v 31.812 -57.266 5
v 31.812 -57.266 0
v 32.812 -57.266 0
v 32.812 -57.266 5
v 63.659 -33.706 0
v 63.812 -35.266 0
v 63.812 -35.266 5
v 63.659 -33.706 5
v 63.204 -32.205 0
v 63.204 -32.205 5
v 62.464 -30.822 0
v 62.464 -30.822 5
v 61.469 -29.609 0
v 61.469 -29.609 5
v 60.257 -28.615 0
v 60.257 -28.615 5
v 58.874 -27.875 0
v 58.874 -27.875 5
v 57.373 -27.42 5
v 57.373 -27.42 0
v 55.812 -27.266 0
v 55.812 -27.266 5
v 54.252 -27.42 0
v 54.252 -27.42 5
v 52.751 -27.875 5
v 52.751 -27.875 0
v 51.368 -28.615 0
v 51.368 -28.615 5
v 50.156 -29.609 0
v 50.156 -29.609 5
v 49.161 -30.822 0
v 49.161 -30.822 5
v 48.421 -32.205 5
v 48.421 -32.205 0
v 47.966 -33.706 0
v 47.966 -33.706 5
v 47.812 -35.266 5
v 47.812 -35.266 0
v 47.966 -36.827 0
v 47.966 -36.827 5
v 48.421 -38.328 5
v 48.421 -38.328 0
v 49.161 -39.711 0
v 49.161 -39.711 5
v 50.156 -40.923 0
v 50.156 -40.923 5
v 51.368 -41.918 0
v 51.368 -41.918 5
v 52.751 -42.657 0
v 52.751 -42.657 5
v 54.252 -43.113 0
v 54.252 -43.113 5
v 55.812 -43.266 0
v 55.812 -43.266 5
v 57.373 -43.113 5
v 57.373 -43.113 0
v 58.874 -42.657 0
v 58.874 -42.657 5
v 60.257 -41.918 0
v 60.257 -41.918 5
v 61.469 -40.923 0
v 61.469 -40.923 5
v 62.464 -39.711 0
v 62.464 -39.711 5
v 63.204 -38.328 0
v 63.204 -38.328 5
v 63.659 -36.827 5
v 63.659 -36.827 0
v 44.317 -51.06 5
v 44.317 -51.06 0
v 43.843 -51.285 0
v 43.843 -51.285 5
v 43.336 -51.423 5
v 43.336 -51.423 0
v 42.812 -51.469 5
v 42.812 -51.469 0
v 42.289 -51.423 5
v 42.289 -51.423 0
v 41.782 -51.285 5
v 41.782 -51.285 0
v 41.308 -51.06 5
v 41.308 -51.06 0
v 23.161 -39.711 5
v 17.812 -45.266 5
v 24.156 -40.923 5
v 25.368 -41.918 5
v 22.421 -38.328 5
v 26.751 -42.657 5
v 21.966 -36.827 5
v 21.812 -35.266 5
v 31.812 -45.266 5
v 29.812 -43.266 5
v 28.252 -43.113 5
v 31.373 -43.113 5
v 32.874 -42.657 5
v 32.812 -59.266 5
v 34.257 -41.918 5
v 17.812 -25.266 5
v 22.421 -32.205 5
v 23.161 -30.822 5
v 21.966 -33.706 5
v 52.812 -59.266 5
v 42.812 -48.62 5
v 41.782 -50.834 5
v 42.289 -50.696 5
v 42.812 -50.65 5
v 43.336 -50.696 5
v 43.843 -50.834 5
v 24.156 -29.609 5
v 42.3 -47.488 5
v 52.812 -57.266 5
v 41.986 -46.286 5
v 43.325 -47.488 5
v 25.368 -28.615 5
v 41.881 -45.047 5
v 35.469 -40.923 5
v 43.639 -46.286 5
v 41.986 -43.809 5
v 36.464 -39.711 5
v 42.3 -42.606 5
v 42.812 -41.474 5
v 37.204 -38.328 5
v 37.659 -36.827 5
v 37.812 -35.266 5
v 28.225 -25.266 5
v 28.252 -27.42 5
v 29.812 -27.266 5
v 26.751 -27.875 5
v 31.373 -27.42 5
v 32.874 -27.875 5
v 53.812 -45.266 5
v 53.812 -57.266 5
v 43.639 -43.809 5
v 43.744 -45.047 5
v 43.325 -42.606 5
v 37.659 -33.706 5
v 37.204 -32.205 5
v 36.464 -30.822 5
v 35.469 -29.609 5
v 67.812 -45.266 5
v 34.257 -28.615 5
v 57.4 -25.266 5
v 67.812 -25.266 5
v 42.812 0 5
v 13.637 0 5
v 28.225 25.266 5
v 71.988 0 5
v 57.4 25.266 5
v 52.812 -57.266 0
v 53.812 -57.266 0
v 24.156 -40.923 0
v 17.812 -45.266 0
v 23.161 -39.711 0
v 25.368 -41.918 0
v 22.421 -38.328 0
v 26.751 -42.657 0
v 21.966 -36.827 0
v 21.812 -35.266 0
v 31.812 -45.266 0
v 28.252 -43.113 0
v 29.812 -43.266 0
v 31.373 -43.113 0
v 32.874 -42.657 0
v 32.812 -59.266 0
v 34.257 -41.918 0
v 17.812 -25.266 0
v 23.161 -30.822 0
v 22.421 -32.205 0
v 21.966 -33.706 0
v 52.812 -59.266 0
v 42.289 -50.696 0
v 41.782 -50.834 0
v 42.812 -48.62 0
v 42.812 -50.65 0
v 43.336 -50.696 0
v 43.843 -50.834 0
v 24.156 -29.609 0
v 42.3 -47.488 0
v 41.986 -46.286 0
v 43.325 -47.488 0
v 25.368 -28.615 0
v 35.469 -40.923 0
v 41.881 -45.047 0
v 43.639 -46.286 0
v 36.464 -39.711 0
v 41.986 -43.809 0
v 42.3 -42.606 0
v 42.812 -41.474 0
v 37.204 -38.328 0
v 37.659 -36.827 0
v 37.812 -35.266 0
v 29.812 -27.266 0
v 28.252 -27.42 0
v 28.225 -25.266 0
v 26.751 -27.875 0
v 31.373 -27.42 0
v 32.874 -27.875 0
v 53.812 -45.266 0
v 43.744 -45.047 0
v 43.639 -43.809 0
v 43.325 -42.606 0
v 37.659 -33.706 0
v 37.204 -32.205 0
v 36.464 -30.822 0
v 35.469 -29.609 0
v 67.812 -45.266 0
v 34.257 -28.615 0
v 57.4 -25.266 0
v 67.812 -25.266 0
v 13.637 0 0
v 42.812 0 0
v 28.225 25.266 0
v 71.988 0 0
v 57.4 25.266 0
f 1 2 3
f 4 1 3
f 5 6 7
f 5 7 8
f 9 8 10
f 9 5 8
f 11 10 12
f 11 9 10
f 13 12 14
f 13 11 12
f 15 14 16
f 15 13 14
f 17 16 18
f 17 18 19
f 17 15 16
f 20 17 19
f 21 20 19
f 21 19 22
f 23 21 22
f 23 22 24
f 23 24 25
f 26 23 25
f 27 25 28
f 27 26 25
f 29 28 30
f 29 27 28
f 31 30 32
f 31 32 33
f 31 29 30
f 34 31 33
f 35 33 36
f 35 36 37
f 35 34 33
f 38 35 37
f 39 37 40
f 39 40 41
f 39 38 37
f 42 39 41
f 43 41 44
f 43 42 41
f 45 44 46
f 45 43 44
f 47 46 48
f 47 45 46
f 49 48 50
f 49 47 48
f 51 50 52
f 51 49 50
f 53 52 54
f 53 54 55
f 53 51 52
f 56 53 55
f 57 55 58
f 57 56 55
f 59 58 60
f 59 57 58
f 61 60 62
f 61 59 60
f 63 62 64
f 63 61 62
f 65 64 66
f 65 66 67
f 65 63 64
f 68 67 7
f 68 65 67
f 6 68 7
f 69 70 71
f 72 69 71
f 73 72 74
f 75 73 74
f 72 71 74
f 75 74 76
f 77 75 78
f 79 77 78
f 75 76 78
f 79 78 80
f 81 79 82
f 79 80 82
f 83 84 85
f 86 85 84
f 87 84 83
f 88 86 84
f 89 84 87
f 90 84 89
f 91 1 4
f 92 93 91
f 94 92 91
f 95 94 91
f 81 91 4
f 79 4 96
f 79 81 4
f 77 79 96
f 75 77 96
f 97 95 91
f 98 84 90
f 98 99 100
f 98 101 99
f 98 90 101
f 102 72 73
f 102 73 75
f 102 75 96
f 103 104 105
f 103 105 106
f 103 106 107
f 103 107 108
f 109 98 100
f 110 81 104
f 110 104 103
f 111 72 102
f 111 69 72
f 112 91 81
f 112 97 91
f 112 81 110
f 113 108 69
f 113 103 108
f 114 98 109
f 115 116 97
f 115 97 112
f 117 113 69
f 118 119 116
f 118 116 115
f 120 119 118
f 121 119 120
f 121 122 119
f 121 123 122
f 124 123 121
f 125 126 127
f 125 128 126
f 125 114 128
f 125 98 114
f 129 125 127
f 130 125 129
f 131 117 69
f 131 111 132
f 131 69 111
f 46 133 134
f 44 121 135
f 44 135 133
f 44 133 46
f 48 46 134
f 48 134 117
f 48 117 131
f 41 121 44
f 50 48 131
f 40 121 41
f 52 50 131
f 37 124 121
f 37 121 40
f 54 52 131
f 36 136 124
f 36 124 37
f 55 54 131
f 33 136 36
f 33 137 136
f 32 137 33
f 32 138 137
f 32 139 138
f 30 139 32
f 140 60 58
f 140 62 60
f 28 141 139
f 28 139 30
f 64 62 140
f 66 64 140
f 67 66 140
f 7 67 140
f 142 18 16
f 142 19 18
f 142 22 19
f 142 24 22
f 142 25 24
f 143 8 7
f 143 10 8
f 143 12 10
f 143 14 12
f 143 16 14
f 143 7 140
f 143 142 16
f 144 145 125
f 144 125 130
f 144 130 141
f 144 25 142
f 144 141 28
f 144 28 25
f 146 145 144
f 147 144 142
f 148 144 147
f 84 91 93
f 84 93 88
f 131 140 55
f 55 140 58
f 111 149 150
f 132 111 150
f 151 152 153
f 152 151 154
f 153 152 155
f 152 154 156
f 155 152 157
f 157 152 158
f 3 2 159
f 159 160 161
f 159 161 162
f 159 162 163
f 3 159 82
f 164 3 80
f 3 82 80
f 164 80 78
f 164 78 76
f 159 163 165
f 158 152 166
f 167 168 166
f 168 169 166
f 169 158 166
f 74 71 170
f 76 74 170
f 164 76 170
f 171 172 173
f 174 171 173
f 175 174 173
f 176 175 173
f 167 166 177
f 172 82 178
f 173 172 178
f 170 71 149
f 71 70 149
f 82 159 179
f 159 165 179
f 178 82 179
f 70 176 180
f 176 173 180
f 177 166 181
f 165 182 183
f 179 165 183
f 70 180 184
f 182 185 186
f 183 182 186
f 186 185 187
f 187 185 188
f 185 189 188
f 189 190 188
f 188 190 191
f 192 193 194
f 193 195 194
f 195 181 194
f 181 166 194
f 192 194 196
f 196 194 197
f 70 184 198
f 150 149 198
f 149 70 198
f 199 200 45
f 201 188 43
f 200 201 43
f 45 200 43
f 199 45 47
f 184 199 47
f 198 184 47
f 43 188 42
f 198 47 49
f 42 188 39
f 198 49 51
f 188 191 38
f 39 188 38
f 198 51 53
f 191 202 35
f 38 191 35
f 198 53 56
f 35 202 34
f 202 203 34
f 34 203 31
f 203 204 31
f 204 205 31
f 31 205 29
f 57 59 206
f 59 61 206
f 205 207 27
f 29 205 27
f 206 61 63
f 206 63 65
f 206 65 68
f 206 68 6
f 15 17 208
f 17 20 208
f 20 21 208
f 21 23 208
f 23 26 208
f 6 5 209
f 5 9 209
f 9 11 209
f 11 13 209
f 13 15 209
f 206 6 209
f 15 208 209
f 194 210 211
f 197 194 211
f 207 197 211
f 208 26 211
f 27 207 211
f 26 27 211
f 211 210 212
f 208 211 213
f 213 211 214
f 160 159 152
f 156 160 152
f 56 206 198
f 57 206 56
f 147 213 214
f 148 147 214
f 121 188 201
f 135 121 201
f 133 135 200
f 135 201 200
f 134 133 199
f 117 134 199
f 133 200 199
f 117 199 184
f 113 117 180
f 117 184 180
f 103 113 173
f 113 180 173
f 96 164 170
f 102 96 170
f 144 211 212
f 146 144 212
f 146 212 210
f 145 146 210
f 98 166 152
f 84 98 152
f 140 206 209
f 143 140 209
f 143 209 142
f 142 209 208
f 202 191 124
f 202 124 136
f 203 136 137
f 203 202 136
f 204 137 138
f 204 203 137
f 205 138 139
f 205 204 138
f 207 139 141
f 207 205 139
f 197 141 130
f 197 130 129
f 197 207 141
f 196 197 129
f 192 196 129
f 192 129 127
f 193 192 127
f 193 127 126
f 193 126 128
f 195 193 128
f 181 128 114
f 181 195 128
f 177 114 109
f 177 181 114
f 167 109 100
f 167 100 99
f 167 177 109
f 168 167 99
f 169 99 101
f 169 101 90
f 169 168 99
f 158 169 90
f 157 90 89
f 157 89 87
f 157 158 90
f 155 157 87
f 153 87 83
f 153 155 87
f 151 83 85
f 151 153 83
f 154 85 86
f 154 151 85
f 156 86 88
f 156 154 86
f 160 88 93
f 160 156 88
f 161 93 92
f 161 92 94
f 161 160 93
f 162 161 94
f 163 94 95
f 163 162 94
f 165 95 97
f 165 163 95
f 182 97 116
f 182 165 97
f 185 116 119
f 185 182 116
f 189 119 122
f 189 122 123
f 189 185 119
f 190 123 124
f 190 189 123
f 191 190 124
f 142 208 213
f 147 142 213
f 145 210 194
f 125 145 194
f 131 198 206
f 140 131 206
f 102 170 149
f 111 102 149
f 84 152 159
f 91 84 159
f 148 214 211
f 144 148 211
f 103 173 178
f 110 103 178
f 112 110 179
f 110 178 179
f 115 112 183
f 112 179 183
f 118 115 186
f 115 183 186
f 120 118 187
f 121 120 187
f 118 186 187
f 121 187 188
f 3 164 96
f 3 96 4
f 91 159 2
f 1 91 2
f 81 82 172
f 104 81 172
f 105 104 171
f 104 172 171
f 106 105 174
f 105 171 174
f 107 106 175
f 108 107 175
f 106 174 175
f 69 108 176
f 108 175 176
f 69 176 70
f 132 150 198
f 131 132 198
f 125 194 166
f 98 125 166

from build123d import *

# Parameters (mm, degrees)
F0_R     = 8
F0_W     = 20
F0_H     = 2
F1_DEPTH = 5


with BuildPart() as f1:
    # F0 (on Top) → F1 (new body)
    with BuildSketch(Plane.XY):
        Polygon((28.224968, -25.266338), (17.812495, -25.266338), (17.812495, -35.266338), (17.812495, -45.266338), (31.812495, -45.266338), (31.812495, -57.266338), (32.812495, -57.266338), (52.812495, -57.266338), (53.812495, -57.266338), (53.812495, -45.266338), (67.812495, -45.266338), (67.812495, -25.266338), (57.400022, -25.266338), align=None)
        with Locations((29.812495, -35.266338)):
            Circle(F0_R, mode=Mode.SUBTRACT)
        with BuildLine():
            ThreePointArc((44.317, -51.059522), (42.812495, -51.469457), (41.30799, -51.059522))
            ThreePointArc((41.30799, -51.059522), (42.812495, -50.649587), (44.317, -51.059522))
        make_face(mode=Mode.SUBTRACT)
        with BuildLine():
            ThreePointArc((42.812495, -41.474152), (43.744123, -45.047218), (42.812495, -48.620284))
            ThreePointArc((42.812495, -48.620284), (41.880867, -45.047218), (42.812495, -41.474152))
        make_face(mode=Mode.SUBTRACT)
        with Locations((55.812495, -35.266338)):
            Circle(F0_R, mode=Mode.SUBTRACT)
        Polygon((13.637441, 0), (28.224968, -25.266338), (57.400022, -25.266338), (71.987549, 0), (57.400022, 25.266338), (42.812495, 0), (28.224968, 25.266338), align=None)
        with Locations((42.812495, -58.266338)):
            Rectangle(F0_W, F0_H)
    extrude(amount=F1_DEPTH)


solid = f1.part
